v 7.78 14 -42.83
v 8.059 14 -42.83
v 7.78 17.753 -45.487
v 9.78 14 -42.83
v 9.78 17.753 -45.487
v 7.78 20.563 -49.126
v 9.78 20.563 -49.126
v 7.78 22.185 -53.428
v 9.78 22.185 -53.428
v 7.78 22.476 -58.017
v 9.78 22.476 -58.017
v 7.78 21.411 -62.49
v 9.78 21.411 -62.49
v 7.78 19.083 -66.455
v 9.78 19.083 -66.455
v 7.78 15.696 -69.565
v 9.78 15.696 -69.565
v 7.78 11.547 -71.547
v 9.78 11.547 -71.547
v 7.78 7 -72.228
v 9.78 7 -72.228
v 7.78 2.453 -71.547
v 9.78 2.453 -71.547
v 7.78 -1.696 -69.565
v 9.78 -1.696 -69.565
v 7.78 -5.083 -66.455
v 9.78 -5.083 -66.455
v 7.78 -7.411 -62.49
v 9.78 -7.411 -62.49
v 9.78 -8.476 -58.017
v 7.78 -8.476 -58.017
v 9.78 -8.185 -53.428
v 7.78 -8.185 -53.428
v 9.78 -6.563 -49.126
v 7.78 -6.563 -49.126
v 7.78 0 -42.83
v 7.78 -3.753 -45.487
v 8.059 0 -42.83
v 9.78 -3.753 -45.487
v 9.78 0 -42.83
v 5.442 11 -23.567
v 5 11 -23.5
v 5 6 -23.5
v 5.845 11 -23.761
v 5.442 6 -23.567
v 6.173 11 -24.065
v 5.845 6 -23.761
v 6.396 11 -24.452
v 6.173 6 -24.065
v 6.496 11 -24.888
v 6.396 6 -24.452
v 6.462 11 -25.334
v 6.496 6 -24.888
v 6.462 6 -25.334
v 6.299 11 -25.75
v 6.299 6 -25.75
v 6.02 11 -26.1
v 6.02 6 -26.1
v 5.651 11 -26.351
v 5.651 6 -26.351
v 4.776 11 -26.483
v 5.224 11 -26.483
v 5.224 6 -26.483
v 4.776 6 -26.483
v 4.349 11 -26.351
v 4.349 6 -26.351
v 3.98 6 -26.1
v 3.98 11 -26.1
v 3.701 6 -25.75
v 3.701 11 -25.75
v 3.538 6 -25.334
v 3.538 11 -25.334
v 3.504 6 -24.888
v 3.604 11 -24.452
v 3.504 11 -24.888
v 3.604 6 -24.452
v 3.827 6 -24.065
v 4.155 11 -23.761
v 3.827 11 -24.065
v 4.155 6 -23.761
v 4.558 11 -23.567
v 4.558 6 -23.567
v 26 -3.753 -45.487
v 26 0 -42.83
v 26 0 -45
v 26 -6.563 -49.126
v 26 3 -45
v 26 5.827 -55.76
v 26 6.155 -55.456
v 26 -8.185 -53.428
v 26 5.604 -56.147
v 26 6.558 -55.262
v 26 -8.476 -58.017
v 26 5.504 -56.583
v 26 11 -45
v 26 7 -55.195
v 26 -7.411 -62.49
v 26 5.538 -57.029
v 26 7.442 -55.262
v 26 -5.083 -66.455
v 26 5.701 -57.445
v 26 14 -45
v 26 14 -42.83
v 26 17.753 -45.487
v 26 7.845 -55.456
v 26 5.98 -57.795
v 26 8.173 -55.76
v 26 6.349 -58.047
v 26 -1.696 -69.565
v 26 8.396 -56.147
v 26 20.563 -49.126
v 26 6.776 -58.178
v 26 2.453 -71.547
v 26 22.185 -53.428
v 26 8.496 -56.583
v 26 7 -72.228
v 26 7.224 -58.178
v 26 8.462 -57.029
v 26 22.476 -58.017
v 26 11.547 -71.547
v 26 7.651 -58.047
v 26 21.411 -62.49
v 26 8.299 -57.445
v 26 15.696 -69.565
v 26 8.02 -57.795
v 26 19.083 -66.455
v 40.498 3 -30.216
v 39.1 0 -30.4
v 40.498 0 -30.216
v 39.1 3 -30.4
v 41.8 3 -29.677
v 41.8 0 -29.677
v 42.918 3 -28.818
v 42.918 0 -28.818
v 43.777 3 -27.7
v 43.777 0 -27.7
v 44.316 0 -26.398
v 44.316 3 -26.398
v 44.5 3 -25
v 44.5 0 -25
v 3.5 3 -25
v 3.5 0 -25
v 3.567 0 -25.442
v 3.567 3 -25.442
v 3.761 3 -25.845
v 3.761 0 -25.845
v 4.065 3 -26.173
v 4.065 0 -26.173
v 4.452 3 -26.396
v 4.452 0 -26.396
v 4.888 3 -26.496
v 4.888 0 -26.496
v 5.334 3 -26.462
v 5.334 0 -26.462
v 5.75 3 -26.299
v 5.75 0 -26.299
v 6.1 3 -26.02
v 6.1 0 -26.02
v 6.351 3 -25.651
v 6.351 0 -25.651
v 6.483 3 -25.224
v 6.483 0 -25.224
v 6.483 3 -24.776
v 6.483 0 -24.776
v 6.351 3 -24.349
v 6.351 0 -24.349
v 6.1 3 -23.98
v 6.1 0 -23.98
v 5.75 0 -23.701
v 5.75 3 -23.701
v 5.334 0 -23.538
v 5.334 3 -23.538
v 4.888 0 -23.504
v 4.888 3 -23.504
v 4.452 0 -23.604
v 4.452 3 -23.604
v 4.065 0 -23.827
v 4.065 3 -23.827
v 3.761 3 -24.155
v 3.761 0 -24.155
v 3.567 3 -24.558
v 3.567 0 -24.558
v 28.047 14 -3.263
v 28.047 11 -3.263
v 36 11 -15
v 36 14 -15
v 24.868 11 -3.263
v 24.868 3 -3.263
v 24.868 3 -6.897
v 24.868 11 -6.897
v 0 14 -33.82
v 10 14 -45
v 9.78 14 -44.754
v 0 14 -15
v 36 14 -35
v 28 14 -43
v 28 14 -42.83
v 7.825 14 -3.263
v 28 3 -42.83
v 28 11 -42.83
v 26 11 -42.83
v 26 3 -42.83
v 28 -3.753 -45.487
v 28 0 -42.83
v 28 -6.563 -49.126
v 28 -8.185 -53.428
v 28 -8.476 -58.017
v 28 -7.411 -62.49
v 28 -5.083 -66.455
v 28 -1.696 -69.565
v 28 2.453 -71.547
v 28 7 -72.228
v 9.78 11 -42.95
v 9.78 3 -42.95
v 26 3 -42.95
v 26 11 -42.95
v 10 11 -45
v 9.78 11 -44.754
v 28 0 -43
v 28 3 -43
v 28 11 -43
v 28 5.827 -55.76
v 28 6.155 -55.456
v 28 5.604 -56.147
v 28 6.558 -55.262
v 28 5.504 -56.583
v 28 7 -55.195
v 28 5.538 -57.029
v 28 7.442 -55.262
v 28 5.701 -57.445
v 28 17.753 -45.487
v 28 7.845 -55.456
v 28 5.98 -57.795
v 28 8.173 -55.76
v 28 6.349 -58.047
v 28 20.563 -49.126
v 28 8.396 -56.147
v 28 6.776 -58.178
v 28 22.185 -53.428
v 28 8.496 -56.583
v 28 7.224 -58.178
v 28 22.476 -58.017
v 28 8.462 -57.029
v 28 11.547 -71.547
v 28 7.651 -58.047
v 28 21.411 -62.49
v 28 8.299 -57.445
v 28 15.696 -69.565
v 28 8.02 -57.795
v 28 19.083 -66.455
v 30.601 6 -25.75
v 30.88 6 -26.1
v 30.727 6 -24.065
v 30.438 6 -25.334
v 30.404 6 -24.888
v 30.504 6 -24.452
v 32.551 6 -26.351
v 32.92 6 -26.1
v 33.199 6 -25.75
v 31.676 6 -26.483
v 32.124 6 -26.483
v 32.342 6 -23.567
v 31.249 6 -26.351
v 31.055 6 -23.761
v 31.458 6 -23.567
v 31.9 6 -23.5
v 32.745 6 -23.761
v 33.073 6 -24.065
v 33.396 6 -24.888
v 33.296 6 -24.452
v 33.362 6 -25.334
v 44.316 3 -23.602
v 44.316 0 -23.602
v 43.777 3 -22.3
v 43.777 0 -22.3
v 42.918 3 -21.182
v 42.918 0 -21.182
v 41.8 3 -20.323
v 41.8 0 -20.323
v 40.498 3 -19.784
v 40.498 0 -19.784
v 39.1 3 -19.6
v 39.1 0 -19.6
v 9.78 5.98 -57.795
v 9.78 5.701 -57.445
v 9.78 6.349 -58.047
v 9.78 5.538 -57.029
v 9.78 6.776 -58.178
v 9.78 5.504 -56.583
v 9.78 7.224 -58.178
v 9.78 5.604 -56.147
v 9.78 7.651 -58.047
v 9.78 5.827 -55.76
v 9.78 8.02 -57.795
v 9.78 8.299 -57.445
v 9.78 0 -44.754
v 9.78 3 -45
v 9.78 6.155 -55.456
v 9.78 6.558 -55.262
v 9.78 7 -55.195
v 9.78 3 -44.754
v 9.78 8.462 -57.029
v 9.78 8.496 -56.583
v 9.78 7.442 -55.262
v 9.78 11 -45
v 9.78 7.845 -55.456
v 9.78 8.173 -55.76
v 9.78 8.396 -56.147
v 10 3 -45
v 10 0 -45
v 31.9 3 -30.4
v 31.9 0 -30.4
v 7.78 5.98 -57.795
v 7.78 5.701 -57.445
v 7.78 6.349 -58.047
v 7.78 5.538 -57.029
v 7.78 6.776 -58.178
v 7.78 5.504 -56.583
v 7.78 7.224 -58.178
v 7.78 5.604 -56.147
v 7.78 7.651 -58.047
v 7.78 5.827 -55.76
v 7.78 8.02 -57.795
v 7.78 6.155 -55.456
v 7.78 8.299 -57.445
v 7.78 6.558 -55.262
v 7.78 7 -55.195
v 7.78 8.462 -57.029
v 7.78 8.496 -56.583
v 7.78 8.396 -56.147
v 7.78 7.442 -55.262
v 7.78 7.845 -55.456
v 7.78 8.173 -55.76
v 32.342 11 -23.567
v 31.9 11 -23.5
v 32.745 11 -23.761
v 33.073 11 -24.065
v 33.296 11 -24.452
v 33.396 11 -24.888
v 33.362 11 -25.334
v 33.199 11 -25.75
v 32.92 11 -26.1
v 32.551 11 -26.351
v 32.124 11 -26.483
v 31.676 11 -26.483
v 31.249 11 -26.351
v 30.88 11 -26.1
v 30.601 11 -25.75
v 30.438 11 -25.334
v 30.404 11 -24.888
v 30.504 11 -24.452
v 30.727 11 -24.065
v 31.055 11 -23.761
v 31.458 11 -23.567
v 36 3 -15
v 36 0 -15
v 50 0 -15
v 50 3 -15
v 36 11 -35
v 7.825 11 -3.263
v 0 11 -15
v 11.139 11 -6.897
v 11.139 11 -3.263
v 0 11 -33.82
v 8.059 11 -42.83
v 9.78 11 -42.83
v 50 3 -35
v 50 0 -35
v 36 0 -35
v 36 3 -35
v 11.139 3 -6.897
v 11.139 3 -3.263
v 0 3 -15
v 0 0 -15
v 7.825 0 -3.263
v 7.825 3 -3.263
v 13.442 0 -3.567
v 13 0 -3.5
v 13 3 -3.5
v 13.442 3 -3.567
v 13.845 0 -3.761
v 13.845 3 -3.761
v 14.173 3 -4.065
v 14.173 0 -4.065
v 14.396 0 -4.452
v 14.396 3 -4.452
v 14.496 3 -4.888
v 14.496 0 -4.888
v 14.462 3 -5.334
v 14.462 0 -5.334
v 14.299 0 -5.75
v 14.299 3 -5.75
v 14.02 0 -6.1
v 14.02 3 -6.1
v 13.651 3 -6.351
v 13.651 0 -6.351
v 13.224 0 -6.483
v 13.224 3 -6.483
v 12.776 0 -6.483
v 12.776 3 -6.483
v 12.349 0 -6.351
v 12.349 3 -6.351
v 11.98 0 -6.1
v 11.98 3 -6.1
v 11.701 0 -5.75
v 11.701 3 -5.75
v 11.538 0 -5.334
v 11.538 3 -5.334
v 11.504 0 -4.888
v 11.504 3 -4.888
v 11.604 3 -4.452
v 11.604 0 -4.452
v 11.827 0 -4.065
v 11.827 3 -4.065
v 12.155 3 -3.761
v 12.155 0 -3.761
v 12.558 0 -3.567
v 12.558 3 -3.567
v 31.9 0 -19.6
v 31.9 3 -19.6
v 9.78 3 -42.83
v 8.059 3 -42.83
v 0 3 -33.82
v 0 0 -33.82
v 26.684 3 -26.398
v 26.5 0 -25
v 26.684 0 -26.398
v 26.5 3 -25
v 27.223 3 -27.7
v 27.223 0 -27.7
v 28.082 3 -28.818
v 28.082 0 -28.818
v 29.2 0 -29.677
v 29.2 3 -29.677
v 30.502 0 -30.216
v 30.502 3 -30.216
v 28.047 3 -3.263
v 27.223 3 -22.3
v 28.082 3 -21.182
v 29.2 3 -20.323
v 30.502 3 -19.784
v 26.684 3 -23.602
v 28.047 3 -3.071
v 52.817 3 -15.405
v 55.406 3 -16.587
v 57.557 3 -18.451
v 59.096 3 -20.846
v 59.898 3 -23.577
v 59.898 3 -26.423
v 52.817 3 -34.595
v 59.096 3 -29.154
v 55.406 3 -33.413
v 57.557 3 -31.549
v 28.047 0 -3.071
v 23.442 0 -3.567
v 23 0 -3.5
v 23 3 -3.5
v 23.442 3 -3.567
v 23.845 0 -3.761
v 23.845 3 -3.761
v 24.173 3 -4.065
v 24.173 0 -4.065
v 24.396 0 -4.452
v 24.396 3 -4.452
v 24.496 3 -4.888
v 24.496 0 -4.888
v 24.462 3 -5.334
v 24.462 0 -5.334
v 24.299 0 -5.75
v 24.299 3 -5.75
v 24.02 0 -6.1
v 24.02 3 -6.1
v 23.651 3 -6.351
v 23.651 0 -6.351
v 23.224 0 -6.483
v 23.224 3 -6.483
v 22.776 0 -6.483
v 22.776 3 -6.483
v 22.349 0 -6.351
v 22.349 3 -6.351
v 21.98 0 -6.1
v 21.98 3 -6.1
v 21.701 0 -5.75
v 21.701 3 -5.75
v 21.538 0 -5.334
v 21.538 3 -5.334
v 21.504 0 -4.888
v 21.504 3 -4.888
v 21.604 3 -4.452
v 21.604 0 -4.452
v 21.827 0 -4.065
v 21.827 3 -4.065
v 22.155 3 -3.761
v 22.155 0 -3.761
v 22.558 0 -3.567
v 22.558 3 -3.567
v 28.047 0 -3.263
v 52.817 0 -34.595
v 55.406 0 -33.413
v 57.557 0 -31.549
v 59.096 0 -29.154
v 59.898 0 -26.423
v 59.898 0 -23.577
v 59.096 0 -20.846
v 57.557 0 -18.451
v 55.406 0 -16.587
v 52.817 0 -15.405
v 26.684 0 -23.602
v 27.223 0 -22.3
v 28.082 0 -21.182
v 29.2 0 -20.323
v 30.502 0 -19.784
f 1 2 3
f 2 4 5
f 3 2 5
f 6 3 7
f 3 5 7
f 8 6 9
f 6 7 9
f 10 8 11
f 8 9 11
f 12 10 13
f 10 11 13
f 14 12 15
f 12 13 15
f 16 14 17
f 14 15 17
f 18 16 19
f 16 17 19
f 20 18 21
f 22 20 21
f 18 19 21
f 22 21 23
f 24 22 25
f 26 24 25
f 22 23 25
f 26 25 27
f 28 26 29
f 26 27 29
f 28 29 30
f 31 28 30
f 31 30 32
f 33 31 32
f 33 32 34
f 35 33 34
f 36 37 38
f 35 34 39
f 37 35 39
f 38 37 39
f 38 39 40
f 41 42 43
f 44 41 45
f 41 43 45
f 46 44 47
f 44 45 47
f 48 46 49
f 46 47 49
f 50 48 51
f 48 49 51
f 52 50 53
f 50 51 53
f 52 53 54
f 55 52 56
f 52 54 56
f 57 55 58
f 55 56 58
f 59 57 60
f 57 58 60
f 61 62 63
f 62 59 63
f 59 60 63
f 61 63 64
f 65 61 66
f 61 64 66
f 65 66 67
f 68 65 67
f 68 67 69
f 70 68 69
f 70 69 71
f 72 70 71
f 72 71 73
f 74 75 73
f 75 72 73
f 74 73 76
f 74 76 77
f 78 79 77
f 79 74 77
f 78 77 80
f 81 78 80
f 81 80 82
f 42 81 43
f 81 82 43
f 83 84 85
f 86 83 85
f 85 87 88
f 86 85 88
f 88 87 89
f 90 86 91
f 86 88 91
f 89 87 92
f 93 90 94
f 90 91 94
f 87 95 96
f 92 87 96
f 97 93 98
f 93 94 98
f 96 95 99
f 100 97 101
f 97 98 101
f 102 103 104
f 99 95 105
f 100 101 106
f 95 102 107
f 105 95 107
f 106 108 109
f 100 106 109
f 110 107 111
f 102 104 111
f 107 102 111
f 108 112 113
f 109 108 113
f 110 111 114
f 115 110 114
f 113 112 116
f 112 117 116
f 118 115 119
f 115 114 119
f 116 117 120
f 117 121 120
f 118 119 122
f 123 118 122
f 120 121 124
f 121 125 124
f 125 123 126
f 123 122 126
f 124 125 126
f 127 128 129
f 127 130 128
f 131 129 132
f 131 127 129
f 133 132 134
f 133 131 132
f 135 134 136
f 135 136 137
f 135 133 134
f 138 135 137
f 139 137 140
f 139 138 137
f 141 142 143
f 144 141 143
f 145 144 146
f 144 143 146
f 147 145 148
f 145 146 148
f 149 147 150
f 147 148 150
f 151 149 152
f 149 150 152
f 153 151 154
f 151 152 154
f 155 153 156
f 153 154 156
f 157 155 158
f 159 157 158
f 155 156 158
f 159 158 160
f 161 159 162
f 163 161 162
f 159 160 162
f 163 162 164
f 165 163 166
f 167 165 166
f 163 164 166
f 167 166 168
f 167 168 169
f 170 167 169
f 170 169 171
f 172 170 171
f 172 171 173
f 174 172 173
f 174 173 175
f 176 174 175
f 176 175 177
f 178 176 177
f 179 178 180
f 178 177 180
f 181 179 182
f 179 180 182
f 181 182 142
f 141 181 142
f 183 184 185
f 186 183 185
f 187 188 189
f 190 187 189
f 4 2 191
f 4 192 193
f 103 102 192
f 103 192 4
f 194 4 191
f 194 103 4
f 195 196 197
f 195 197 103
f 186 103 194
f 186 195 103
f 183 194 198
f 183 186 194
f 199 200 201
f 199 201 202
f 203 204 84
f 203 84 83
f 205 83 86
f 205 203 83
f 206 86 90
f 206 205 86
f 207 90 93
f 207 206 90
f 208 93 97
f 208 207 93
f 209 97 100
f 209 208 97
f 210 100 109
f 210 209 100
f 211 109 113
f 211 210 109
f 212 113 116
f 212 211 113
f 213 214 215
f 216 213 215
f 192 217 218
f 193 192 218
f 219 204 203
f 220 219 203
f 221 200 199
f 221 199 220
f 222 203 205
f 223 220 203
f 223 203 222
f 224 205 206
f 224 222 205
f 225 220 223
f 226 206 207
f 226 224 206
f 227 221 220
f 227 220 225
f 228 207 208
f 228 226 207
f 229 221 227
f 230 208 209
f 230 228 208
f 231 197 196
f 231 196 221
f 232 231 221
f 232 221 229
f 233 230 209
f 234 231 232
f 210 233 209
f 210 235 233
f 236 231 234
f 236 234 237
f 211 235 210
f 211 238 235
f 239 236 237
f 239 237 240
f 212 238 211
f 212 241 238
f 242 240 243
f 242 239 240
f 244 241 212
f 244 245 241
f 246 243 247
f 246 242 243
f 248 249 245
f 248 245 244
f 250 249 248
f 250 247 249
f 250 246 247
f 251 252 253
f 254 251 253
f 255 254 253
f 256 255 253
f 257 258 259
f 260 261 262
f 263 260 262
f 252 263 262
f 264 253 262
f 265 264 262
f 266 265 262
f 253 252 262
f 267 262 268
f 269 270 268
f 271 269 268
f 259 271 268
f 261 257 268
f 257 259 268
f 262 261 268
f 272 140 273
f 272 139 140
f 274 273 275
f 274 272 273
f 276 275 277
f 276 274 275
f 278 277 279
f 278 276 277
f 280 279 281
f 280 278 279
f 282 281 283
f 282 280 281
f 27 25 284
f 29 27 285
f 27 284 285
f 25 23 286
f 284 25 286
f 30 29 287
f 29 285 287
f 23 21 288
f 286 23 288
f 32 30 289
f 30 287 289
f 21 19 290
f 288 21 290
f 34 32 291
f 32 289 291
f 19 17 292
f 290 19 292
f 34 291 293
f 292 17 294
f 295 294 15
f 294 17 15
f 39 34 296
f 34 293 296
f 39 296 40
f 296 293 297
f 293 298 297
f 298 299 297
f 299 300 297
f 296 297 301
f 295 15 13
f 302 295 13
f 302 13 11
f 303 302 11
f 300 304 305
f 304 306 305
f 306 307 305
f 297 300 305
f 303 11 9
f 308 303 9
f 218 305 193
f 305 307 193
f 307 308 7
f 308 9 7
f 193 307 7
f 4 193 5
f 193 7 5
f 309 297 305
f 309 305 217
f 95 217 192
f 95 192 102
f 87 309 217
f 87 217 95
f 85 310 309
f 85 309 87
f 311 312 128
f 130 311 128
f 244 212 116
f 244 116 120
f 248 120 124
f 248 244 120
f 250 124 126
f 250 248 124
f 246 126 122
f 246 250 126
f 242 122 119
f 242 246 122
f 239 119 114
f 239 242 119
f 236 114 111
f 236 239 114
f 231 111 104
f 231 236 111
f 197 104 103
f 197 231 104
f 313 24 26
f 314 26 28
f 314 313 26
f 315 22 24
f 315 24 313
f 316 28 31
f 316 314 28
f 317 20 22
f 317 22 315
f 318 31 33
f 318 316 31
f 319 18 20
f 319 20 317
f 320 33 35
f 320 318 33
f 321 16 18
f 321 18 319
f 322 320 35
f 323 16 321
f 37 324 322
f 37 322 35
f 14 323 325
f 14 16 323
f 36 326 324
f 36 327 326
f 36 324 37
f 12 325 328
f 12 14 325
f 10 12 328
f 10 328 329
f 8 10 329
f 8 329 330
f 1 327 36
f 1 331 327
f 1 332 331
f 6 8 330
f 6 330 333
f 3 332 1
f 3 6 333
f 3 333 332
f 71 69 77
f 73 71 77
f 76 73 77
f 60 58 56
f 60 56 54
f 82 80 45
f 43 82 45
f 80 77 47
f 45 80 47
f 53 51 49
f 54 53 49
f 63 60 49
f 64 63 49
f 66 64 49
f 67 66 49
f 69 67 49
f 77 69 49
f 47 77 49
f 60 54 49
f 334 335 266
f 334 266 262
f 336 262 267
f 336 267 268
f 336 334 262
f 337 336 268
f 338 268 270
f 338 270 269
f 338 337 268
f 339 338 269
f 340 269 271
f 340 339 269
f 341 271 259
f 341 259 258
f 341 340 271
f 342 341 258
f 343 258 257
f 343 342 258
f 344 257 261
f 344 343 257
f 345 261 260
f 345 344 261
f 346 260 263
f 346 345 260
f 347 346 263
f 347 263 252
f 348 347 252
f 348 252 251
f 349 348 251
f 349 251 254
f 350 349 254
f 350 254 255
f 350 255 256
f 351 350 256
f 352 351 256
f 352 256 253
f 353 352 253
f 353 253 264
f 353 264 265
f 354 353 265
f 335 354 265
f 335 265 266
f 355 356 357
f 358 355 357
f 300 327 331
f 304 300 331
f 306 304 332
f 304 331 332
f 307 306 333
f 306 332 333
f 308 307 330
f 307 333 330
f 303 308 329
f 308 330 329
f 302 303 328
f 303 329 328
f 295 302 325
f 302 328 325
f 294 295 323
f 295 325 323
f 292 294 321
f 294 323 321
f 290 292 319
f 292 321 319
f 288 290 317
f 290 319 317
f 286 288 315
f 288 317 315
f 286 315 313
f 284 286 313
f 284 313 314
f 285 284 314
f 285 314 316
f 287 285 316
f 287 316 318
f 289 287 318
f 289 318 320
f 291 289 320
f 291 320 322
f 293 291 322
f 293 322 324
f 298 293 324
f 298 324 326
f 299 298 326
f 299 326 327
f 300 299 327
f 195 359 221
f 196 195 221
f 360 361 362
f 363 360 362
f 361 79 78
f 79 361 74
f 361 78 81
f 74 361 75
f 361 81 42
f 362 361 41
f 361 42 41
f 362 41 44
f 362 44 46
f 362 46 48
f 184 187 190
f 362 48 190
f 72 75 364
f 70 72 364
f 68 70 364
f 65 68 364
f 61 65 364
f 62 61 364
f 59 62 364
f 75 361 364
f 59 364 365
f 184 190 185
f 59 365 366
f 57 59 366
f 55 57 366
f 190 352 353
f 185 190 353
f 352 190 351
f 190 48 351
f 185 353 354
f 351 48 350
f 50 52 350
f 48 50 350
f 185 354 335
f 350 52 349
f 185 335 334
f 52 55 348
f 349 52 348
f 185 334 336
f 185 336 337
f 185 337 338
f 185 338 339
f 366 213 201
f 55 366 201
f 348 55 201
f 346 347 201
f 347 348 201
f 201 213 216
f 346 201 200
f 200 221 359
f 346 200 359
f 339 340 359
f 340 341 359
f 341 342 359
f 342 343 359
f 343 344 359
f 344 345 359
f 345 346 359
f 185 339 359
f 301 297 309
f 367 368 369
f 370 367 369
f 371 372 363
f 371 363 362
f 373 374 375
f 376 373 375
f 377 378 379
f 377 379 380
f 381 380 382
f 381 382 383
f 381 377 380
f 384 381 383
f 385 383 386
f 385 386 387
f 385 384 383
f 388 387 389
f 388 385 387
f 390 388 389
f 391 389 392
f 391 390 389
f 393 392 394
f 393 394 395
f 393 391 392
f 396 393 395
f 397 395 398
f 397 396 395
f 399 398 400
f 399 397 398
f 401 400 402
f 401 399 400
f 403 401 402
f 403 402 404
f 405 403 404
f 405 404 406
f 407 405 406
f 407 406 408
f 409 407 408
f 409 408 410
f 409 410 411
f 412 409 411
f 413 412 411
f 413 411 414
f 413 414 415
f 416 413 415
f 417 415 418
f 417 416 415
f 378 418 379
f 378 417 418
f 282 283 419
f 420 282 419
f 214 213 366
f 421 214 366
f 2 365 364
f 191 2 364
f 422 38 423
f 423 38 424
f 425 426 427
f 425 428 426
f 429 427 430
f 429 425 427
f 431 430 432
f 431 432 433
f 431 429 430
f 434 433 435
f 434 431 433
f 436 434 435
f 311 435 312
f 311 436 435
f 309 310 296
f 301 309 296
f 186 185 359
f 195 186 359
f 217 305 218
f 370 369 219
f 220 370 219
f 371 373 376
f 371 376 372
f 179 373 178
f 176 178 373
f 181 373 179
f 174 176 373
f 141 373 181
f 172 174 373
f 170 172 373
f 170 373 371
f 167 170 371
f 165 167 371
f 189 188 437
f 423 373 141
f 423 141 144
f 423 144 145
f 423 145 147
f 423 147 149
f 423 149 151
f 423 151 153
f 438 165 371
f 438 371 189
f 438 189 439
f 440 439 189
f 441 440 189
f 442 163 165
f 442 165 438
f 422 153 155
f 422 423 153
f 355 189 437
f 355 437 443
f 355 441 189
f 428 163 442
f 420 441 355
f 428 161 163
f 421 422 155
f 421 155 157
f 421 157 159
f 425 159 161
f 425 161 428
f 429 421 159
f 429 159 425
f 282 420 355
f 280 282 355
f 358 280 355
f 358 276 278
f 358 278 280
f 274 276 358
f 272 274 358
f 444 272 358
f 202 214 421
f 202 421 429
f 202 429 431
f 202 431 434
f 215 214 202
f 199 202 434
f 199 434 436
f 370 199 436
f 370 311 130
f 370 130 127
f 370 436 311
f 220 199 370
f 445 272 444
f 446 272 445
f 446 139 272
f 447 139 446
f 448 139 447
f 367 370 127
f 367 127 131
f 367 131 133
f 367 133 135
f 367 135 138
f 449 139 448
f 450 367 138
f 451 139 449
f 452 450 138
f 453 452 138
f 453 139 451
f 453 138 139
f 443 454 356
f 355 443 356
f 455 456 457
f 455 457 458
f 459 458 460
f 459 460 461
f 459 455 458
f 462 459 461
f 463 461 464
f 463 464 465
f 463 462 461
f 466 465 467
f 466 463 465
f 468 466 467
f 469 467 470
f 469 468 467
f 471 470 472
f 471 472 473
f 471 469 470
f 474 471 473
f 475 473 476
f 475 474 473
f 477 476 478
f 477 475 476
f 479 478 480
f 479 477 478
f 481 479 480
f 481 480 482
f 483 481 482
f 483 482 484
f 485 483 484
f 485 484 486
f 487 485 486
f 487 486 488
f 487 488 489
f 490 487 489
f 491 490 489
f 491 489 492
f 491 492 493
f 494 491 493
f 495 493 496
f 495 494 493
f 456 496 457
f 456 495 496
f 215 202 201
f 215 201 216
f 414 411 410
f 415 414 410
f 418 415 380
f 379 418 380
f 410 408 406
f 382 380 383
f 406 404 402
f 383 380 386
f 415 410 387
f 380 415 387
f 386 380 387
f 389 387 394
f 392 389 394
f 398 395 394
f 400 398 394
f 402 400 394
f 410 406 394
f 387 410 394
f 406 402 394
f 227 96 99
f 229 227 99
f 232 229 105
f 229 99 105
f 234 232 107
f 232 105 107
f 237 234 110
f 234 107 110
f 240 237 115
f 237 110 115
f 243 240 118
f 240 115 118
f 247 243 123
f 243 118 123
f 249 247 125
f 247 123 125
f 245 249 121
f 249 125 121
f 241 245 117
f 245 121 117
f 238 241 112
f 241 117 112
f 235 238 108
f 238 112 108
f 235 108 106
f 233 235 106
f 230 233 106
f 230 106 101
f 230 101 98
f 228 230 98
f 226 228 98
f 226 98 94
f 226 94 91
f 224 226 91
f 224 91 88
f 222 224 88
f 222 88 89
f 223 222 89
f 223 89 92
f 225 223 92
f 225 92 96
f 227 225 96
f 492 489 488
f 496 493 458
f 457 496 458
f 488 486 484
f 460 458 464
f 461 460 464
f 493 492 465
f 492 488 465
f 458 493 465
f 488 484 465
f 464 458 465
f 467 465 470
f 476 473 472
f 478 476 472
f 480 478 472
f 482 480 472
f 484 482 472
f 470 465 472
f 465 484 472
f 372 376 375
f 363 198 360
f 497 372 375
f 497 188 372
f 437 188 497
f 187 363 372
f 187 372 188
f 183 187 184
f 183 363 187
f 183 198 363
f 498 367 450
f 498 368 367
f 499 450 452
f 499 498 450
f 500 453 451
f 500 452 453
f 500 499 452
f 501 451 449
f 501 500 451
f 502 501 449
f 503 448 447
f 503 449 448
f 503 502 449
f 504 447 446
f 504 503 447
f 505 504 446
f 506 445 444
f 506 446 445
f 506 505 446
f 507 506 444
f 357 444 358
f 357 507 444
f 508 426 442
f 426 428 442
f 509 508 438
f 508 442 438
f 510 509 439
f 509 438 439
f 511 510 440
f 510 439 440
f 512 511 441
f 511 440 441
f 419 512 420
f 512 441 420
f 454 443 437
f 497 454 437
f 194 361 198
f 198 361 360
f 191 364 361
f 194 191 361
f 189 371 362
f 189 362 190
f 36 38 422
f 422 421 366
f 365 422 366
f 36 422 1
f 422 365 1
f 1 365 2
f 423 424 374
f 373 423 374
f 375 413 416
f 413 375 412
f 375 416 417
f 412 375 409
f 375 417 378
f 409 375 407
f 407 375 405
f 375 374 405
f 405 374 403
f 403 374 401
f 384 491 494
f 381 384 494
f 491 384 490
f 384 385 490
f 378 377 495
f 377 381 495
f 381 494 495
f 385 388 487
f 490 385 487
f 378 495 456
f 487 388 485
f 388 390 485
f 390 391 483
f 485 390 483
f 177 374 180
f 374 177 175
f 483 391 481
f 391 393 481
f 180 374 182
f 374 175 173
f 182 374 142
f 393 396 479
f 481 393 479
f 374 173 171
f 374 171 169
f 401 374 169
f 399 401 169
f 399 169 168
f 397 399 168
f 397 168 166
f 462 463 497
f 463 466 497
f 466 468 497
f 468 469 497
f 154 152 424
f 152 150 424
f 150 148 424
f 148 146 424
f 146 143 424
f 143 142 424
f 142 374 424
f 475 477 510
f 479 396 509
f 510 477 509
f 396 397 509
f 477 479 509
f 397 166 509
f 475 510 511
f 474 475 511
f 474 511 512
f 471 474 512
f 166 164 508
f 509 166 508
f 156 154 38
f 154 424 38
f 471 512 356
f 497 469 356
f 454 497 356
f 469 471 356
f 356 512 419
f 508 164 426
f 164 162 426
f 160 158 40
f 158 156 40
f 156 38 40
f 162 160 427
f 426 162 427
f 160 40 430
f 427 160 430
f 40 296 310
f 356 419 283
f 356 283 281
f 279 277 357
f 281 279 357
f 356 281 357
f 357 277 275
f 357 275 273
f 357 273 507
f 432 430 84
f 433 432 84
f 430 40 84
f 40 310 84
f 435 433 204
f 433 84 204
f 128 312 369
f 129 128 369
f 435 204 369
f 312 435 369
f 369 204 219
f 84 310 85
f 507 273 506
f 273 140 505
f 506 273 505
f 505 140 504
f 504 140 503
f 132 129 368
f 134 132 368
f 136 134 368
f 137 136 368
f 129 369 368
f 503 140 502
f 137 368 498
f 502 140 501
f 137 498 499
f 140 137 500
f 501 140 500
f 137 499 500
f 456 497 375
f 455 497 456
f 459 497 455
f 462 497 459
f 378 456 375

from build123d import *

# Parameters (mm, degrees)
SKETCH1_R            = 1.5
BOSS_EXTRUDE1_DEPTH  = 3
FILLET5_RADIUS       = 10
FILLET5_LENGTH       = 3
FILLET2_R            = 5.4
FILLET4_R            = 5.4
SKETCH2_W            = 20.222728951
SKETCH2_H            = 4.462372077
CUT_EXTRUDE1_DEPTH   = 6
BOSS_EXTRUDE2_START  = 8
BOSS_EXTRUDE2_DEPTH  = 3
SKETCH4_W            = 16.22017041
SKETCH4_H            = 2.049534957
SKETCH4_W_2          = 13.728839959
SKETCH4_H_2          = 3.633925055
BOSS_EXTRUDE3_DEPTH  = 8
BOSS_EXTRUDE4_START  = -8
SKETCH5_R            = 1.5
BOSS_EXTRUDE4_DEPTH  = 8
SKETCH6_R            = 1.5
BOSS_EXTRUDE5_DEPTH  = 8
BOSS_EXTRUDE9_DEPTH  = 2
BOSS_EXTRUDE10_START = 2
SKETCH10_W           = 2.049534957
SKETCH10_H           = 8
BOSS_EXTRUDE10_DEPTH = 2
SKETCH11_R           = 1.5
CUT_EXTRUDE2_DEPTH   = 21


with BuildPart() as part:
    # Sketch1 → Boss-Extrude1 (new body)
    # profile 1 of 2: a face of its own
    with BuildSketch(Plane(origin=(0, 0, 0), x_dir=(1, 0, 0), z_dir=(0, 1, 0))):
        with BuildLine():
            Line((3.5, 25), (0, 25))
            Line((0, 25), (0, 15))
            Line((0, 15), (10, 0))
            Line((10, 0), (26, 0))
            Line((26, 0), (36, 15))
            Line((36, 15), (60, 15))
            Line((60, 15), (60, 25))
            Line((60, 25), (44.5, 25))
            Line((44.5, 25), (44.5, 19.6))
            Line((44.5, 19.6), (26.5, 19.6))
            Line((26.5, 19.6), (26.5, 25))
            Line((26.5, 25), (6.5, 25))
            ThreePointArc((6.5, 25), (5, 23.5), (3.5, 25))
        make_face()
        with Locations(Location((13, 5, 0), (0, 0, 270))):
            Circle(SKETCH1_R, mode=Mode.SUBTRACT)
        with Locations(Location((23, 5, 0), (0, 0, 270))):
            Circle(SKETCH1_R, mode=Mode.SUBTRACT)
    # profile 2 of 2: a face of its own
    with BuildSketch(Plane(origin=(0, 0, 0), x_dir=(1, 0, 0), z_dir=(0, 1, 0))):
        with BuildLine():
            Line((10, 45), (0, 33.819660113))
            Line((0, 33.819660113), (0, 25))
            Line((0, 25), (3.5, 25))
            ThreePointArc((3.5, 25), (5, 26.5), (6.5, 25))
            Line((6.5, 25), (26.5, 25))
            Line((26.5, 25), (26.5, 30.4))
            Line((26.5, 30.4), (44.5, 30.4))
            Line((44.5, 30.4), (44.5, 25))
            Line((44.5, 25), (60, 25))
            Line((60, 25), (60, 35))
            Line((60, 35), (36, 35))
            Line((36, 35), (26, 45))
            Line((26, 45), (10, 45))
        make_face()
    extrude(amount=BOSS_EXTRUDE1_DEPTH)

    # Fillet5: full round fillet: the end face becomes a half cylinder, R = half its width
    fillet5_face = Plane((60, 1.5, -25), x_dir=(0, -1, 0), z_dir=(1, 0, 0))  # on the end face: x along it, z out of the body
    fillet5_slab = fillet5_face.offset(-FILLET5_RADIUS / 2) * Box(FILLET5_LENGTH, 2 * FILLET5_RADIUS, FILLET5_RADIUS, mode=Mode.PRIVATE)  # the body's end, R deep
    fillet5_round = Plane((50, 1.5, -25), x_dir=(1, 0, 0), z_dir=(0, -1, 0)) * Cylinder(FILLET5_RADIUS, FILLET5_LENGTH, mode=Mode.PRIVATE)  # its axis R under the face
    add(fillet5_slab - fillet5_round, mode=Mode.SUBTRACT)

    # Fillet2
    fillet2_edges = [part.edges().sort_by_distance(p)[0] for p in [
        (26.5, 1.5, -30.4),
        (26.5, 1.5, -19.6),
    ]]
    fillet(fillet2_edges, radius=FILLET2_R - 0.0001)  # a hair under: the kernel refuses the full size

    # Fillet4
    fillet4_edges = [part.edges().sort_by_distance(p)[0] for p in [
        (44.5, 1.5, -19.6),
        (44.5, 1.5, -30.4),
    ]]
    fillet(fillet4_edges, radius=FILLET4_R - 0.0001)  # a hair under: the kernel refuses the full size

    # Sketch2 → Cut-Extrude1 (cut)
    with BuildSketch(Plane(origin=(0, 3, 0), x_dir=(1, 0, 0), z_dir=(0, 1, 0))):
        with Locations((17.936134509, 1.031658913)):
            Rectangle(SKETCH2_W, SKETCH2_H)
    extrude(amount=-CUT_EXTRUDE1_DEPTH, mode=Mode.SUBTRACT)



with BuildPart() as body_2:
    # Sketch3 → Boss-Extrude2 (new body)
    with BuildSketch(Plane(origin=(0, 3, 0), x_dir=(1, 0, 0), z_dir=(0, 1, 0)).offset(BOSS_EXTRUDE2_START)):
        Polygon((10, 45), (0, 33.819660113), (0, 15), (7.824770033, 3.262844951), (28.047498984, 3.262844951), (36, 15), (36, 35), (26, 45), align=None)
    extrude(amount=BOSS_EXTRUDE2_DEPTH)


with BuildPart() as part_1:
    add(part.part)

    add(body_2.part)  # Boss-Extrude3 merges body 2
    # Sketch4 → Boss-Extrude3 (add)
    with BuildSketch(Plane(origin=(0, 3, 0), x_dir=(1, 0, 0), z_dir=(0, 1, 0))):
        with Locations((17.889914795, 43.975232522)):
            Rectangle(SKETCH4_W, SKETCH4_H)
        with Locations((18.003368014, 5.079807479)):
            Rectangle(SKETCH4_W_2, SKETCH4_H_2)
    extrude(amount=BOSS_EXTRUDE3_DEPTH)

    # Sketch5 → Boss-Extrude4 (add)
    with BuildSketch(Plane(origin=(0, 14, 0), x_dir=(1, 0, 0), z_dir=(0, 1, 0)).offset(BOSS_EXTRUDE4_START)):
        with Locations(Location((5, 25, 0), (0, 0, 270))):
            Circle(SKETCH5_R)
    extrude(amount=BOSS_EXTRUDE4_DEPTH)

    # Sketch6 → Boss-Extrude5 (add)
    with BuildSketch(Plane(origin=(0, 14, 0), x_dir=(1, 0, 0), z_dir=(0, 1, 0))):
        with Locations(Location((31.9, 25, 0), (0, 0, 270))):
            Circle(SKETCH6_R)
    extrude(amount=-BOSS_EXTRUDE5_DEPTH)

    # Sketch7 → Boss-Extrude9 (add)
    # profile 1 of 2: a face of its own
    with BuildSketch(Plane.ZY.offset(-9.77982959)):
        with BuildLine():
            ThreePointArc((-42.829650223, 14), (-72.227622353, 7), (-42.829650223, 0))
            Line((-42.829650223, 0), (-42.829650223, 14))
        make_face()
        Polygon((-44.753841998, 3), (-45, 3), (-45, 11), (-44.753841998, 11), (-42.950465043, 11), (-42.950465043, 3), align=None, mode=Mode.SUBTRACT)
    # profile 2 of 2: a face of its own
    with BuildSketch(Plane.ZY.offset(-9.77982959)):
        Polygon((-45, 11), (-45, 3), (-44.753841998, 3), (-42.950465043, 3), (-42.950465043, 11), (-44.753841998, 11), align=None)
    extrude(amount=BOSS_EXTRUDE9_DEPTH)

    # Sketch10 → Boss-Extrude10 (add)
    # profile 1 of 2: a face of its own
    with BuildSketch(Plane(origin=(26, 0, 0), x_dir=(0, 0, -1), z_dir=(1, 0, 0)).offset(BOSS_EXTRUDE10_START)):
        with BuildLine():
            ThreePointArc((72.227622353, 7), (60.293097644, 22.109936841), (42.829650223, 14))
            Line((42.829650223, 14), (42.829650223, 0))
            ThreePointArc((42.829650223, 0), (60.293097644, -8.109936841), (72.227622353, 7))
        make_face()
        with Locations((43.975232522, 7)):
            Rectangle(SKETCH10_W, SKETCH10_H, mode=Mode.SUBTRACT)
    # profile 2 of 2: a face of its own
    with BuildSketch(Plane(origin=(26, 0, 0), x_dir=(0, 0, -1), z_dir=(1, 0, 0)).offset(BOSS_EXTRUDE10_START)):
        with Locations((43.975232522, 7)):
            Rectangle(SKETCH10_W, SKETCH10_H)
    extrude(amount=-BOSS_EXTRUDE10_DEPTH)

    # Sketch11 → Cut-Extrude2 (cut)
    with BuildSketch(Plane.ZY.offset(-7.77982959)):
        with Locations((-56.695245471, 7)):
            Circle(SKETCH11_R)
    extrude(amount=-CUT_EXTRUDE2_DEPTH, mode=Mode.SUBTRACT)


solid = part_1.part
